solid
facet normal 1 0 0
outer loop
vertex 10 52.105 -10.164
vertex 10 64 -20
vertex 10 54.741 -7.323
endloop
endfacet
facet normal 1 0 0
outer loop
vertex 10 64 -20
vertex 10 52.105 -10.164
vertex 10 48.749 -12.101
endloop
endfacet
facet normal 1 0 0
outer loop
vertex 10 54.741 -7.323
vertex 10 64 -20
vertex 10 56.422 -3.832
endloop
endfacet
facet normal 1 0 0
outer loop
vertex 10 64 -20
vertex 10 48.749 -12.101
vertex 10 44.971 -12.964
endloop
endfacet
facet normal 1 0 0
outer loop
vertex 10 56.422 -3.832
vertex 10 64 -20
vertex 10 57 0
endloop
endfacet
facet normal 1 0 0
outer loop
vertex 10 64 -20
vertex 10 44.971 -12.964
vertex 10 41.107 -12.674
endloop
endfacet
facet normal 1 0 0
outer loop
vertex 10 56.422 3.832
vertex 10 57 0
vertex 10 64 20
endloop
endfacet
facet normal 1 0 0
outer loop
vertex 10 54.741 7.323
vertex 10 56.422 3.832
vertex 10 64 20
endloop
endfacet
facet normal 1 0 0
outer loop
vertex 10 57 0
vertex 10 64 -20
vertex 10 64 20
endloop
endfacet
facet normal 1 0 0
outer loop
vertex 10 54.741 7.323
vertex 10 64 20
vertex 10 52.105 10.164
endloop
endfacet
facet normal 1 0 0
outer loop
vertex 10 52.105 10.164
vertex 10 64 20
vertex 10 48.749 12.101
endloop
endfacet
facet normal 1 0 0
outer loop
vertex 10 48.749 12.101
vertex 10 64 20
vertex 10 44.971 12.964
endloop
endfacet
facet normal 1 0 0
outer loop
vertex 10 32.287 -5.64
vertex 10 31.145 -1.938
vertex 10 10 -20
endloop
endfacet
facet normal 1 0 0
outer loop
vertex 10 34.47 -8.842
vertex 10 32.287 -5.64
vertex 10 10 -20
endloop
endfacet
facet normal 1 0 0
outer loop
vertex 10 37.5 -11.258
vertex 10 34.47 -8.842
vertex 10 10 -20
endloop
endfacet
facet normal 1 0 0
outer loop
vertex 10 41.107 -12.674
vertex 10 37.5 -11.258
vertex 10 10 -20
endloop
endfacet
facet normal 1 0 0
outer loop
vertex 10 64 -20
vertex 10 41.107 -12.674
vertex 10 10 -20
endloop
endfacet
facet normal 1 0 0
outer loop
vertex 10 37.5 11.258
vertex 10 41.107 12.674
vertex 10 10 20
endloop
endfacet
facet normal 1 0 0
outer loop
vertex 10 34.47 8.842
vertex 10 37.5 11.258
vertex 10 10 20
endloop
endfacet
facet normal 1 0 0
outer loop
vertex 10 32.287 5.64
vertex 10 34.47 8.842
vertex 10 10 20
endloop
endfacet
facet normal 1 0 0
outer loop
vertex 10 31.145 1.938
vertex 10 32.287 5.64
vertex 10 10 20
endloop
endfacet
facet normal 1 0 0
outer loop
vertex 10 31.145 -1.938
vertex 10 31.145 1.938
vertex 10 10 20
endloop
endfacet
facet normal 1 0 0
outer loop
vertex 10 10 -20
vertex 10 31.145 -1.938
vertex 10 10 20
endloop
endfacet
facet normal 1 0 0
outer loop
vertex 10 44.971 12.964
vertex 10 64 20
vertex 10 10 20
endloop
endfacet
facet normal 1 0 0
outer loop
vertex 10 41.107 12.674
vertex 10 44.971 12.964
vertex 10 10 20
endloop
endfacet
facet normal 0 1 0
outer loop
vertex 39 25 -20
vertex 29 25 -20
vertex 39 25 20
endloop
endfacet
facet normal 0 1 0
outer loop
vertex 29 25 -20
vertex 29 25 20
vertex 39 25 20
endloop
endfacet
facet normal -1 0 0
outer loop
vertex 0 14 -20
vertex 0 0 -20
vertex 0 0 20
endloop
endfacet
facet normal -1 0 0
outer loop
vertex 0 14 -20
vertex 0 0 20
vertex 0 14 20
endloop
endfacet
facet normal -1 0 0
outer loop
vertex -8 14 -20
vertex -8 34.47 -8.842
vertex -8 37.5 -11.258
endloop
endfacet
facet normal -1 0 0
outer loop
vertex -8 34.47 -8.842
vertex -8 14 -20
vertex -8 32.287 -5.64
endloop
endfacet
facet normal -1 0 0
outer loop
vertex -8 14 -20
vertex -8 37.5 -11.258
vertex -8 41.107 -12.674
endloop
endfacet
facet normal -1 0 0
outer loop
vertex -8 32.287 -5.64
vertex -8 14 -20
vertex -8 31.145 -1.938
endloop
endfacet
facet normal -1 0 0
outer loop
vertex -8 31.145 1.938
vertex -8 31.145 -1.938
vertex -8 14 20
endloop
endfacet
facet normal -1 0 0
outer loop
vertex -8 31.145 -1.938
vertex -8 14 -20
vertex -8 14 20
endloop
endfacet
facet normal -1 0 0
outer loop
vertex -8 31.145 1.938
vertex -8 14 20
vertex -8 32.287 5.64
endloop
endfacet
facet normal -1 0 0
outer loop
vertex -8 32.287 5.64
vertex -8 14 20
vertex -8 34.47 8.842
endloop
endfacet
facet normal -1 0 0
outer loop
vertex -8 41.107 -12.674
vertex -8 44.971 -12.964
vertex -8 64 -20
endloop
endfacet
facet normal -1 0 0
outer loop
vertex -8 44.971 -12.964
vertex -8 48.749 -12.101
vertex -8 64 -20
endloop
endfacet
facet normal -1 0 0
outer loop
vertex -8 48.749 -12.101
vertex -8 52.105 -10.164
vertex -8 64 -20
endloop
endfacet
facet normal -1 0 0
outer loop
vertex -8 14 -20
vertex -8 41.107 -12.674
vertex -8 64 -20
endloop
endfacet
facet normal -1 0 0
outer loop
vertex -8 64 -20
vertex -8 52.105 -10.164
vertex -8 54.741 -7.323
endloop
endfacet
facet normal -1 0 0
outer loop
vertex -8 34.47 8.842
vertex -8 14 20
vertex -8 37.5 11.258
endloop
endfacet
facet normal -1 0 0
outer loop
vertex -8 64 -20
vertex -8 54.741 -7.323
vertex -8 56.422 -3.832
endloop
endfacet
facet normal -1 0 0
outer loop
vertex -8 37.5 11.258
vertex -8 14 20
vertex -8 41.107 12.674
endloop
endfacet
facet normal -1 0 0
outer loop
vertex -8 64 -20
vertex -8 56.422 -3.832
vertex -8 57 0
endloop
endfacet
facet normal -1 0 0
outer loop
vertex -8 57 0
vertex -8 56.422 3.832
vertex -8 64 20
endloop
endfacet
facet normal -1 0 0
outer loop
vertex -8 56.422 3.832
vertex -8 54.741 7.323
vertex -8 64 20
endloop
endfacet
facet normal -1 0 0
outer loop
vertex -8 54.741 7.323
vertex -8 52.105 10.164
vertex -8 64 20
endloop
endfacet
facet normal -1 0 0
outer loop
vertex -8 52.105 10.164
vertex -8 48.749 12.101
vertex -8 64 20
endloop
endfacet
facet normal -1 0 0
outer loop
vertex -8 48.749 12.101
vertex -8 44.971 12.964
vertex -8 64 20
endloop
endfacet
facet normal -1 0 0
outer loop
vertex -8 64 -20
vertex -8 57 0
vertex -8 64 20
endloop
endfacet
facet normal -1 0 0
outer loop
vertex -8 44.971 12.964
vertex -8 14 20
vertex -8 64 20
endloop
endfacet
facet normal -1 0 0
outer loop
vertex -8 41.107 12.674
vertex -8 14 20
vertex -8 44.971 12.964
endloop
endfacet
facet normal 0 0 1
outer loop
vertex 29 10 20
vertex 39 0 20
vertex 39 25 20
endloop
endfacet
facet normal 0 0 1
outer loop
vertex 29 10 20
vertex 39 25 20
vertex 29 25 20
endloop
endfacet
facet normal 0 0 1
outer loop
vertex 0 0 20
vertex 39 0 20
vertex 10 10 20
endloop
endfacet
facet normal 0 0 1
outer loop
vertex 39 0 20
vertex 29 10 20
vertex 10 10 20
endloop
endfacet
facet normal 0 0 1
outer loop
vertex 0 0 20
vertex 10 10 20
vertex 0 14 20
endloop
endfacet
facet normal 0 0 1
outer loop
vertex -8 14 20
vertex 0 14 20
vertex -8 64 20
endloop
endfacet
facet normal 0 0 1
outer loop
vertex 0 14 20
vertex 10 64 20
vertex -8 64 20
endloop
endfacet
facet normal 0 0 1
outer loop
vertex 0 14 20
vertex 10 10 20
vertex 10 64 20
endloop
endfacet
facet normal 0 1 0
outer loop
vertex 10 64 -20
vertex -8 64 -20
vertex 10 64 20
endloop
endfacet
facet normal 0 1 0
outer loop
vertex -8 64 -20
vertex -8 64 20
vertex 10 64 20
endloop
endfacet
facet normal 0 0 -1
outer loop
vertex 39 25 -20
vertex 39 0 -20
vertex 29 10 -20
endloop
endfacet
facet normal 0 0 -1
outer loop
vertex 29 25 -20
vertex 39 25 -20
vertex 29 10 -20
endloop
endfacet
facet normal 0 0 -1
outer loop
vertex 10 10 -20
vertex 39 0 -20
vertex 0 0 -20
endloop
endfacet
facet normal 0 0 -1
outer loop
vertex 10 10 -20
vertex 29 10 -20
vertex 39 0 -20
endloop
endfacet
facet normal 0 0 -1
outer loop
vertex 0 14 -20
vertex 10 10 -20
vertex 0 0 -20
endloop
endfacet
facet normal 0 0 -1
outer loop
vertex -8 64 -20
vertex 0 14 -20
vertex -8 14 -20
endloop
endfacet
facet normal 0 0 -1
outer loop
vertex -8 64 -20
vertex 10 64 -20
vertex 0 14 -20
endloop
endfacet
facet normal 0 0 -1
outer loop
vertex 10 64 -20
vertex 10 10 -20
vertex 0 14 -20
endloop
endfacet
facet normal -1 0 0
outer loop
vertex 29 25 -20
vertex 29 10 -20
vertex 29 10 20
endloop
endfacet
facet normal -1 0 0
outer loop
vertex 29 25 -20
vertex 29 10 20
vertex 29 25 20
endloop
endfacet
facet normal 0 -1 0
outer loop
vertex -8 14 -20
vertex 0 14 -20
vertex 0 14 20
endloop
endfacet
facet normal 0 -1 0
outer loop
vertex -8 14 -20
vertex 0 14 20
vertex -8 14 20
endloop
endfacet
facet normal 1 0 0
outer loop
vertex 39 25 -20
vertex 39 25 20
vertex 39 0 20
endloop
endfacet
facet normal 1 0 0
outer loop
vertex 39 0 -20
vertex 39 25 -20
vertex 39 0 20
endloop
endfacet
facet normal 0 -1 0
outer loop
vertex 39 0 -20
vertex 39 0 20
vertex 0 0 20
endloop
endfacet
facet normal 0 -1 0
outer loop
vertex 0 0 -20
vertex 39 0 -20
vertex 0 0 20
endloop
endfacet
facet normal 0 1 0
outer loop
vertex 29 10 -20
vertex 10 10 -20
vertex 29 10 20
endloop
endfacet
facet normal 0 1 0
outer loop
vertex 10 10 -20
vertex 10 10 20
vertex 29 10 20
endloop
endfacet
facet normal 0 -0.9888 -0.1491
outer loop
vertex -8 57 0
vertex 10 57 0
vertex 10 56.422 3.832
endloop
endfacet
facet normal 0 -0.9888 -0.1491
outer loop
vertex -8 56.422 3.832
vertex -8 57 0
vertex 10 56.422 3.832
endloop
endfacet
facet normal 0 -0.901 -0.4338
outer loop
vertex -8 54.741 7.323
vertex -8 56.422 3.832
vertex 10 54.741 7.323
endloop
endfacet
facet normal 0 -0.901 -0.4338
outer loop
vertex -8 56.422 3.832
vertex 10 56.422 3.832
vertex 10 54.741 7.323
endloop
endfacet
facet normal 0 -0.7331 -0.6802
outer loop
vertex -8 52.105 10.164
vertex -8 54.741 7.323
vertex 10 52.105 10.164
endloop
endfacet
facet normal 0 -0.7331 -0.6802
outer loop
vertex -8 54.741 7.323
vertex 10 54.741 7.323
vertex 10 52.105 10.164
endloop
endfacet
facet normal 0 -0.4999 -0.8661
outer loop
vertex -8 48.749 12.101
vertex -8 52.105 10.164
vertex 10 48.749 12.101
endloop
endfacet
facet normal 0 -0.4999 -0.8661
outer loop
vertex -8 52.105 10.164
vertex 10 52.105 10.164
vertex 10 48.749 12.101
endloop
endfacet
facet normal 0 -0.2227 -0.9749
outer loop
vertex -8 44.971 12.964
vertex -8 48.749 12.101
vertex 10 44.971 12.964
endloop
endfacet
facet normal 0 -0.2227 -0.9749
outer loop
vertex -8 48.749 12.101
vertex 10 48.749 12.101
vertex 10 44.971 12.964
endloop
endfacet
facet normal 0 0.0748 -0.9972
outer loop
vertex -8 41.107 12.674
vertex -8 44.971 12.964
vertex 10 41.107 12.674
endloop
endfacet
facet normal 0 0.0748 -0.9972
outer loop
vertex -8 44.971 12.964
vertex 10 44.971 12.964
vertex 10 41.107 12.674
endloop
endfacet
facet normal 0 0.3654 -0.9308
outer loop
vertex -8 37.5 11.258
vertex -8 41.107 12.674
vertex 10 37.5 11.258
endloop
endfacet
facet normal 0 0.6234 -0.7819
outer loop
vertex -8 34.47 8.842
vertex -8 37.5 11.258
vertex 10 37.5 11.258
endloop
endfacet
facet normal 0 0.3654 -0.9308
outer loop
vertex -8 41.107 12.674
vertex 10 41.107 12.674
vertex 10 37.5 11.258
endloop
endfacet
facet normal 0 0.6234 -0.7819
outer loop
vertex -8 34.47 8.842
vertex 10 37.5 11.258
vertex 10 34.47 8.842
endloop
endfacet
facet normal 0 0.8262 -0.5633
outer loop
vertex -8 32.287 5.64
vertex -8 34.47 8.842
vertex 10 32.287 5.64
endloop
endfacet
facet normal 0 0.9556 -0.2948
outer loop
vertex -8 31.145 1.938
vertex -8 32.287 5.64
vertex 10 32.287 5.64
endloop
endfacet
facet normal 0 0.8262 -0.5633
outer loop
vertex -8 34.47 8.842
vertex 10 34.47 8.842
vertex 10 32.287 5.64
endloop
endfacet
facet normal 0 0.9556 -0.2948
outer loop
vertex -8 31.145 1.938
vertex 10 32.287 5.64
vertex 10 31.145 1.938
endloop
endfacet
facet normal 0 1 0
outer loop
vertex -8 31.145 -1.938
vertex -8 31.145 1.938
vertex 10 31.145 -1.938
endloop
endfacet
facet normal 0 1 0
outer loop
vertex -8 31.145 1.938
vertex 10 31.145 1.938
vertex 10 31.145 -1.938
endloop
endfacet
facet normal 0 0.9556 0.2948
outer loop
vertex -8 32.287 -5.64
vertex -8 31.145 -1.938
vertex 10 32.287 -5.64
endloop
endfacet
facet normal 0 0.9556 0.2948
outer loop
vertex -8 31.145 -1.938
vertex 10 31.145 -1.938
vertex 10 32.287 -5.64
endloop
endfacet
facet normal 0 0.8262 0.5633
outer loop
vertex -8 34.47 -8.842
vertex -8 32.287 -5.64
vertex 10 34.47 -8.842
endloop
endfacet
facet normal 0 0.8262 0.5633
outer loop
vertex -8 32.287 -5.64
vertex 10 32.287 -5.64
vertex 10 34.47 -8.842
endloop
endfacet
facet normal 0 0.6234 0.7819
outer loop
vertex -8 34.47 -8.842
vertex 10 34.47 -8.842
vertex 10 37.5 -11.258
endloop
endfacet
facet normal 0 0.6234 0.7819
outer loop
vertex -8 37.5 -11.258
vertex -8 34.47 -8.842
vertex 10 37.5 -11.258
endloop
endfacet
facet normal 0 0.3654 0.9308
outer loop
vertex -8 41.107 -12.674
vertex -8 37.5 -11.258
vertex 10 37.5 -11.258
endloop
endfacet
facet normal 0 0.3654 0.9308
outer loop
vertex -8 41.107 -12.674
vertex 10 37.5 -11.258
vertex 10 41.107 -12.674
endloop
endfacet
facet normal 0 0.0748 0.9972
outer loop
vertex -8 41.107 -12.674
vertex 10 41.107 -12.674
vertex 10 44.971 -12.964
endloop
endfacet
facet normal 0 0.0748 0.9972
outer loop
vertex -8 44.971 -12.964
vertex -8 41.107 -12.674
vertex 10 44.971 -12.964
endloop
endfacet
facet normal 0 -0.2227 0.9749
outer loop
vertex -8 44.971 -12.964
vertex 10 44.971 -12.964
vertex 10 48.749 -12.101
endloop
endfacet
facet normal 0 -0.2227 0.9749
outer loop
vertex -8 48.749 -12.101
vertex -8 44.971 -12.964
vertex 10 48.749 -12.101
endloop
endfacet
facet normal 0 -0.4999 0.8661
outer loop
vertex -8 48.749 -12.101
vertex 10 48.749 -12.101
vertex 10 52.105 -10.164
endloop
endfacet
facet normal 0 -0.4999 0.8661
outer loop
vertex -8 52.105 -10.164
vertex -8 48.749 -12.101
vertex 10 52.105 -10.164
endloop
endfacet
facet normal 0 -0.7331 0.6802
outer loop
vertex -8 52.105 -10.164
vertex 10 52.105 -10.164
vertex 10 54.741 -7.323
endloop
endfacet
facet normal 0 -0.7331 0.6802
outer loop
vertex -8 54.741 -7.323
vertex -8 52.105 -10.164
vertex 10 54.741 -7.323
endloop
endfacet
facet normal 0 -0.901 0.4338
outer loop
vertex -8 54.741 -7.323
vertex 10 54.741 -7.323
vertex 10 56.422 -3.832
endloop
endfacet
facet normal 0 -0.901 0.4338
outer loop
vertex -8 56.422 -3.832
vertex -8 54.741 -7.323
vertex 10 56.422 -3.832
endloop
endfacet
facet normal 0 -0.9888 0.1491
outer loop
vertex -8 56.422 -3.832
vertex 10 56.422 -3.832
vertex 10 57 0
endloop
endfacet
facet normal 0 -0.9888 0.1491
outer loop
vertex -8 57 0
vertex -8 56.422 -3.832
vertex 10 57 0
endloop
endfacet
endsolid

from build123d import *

# Parameters (mm, degrees)
BOSS_EXTRUDE1_DEPTH = 20
SKETCH2_R           = 13
CUT_EXTRUDE1_DEPTH  = 40


with BuildPart() as part:
    # Sketch1 → Boss-Extrude1 (new, symmetric)
    with BuildSketch(Plane.XY):
        Polygon((0, 0), (0, 14), (-8, 14), (-8, 64), (10, 64), (10, 10), (29, 10), (29, 25), (39, 25), (39, 0), align=None)
    extrude(amount=BOSS_EXTRUDE1_DEPTH, both=True)

    # Sketch2 → Cut-Extrude1 (cut)
    with BuildSketch(Plane(origin=(10, 0, 0), x_dir=(0, 0, -1), z_dir=(1, 0, 0))):
        with Locations(Location((0, 44, 0), (0, 0, 90))):
            Circle(SKETCH2_R)
    extrude(amount=-CUT_EXTRUDE1_DEPTH, mode=Mode.SUBTRACT)


solid = part.part
